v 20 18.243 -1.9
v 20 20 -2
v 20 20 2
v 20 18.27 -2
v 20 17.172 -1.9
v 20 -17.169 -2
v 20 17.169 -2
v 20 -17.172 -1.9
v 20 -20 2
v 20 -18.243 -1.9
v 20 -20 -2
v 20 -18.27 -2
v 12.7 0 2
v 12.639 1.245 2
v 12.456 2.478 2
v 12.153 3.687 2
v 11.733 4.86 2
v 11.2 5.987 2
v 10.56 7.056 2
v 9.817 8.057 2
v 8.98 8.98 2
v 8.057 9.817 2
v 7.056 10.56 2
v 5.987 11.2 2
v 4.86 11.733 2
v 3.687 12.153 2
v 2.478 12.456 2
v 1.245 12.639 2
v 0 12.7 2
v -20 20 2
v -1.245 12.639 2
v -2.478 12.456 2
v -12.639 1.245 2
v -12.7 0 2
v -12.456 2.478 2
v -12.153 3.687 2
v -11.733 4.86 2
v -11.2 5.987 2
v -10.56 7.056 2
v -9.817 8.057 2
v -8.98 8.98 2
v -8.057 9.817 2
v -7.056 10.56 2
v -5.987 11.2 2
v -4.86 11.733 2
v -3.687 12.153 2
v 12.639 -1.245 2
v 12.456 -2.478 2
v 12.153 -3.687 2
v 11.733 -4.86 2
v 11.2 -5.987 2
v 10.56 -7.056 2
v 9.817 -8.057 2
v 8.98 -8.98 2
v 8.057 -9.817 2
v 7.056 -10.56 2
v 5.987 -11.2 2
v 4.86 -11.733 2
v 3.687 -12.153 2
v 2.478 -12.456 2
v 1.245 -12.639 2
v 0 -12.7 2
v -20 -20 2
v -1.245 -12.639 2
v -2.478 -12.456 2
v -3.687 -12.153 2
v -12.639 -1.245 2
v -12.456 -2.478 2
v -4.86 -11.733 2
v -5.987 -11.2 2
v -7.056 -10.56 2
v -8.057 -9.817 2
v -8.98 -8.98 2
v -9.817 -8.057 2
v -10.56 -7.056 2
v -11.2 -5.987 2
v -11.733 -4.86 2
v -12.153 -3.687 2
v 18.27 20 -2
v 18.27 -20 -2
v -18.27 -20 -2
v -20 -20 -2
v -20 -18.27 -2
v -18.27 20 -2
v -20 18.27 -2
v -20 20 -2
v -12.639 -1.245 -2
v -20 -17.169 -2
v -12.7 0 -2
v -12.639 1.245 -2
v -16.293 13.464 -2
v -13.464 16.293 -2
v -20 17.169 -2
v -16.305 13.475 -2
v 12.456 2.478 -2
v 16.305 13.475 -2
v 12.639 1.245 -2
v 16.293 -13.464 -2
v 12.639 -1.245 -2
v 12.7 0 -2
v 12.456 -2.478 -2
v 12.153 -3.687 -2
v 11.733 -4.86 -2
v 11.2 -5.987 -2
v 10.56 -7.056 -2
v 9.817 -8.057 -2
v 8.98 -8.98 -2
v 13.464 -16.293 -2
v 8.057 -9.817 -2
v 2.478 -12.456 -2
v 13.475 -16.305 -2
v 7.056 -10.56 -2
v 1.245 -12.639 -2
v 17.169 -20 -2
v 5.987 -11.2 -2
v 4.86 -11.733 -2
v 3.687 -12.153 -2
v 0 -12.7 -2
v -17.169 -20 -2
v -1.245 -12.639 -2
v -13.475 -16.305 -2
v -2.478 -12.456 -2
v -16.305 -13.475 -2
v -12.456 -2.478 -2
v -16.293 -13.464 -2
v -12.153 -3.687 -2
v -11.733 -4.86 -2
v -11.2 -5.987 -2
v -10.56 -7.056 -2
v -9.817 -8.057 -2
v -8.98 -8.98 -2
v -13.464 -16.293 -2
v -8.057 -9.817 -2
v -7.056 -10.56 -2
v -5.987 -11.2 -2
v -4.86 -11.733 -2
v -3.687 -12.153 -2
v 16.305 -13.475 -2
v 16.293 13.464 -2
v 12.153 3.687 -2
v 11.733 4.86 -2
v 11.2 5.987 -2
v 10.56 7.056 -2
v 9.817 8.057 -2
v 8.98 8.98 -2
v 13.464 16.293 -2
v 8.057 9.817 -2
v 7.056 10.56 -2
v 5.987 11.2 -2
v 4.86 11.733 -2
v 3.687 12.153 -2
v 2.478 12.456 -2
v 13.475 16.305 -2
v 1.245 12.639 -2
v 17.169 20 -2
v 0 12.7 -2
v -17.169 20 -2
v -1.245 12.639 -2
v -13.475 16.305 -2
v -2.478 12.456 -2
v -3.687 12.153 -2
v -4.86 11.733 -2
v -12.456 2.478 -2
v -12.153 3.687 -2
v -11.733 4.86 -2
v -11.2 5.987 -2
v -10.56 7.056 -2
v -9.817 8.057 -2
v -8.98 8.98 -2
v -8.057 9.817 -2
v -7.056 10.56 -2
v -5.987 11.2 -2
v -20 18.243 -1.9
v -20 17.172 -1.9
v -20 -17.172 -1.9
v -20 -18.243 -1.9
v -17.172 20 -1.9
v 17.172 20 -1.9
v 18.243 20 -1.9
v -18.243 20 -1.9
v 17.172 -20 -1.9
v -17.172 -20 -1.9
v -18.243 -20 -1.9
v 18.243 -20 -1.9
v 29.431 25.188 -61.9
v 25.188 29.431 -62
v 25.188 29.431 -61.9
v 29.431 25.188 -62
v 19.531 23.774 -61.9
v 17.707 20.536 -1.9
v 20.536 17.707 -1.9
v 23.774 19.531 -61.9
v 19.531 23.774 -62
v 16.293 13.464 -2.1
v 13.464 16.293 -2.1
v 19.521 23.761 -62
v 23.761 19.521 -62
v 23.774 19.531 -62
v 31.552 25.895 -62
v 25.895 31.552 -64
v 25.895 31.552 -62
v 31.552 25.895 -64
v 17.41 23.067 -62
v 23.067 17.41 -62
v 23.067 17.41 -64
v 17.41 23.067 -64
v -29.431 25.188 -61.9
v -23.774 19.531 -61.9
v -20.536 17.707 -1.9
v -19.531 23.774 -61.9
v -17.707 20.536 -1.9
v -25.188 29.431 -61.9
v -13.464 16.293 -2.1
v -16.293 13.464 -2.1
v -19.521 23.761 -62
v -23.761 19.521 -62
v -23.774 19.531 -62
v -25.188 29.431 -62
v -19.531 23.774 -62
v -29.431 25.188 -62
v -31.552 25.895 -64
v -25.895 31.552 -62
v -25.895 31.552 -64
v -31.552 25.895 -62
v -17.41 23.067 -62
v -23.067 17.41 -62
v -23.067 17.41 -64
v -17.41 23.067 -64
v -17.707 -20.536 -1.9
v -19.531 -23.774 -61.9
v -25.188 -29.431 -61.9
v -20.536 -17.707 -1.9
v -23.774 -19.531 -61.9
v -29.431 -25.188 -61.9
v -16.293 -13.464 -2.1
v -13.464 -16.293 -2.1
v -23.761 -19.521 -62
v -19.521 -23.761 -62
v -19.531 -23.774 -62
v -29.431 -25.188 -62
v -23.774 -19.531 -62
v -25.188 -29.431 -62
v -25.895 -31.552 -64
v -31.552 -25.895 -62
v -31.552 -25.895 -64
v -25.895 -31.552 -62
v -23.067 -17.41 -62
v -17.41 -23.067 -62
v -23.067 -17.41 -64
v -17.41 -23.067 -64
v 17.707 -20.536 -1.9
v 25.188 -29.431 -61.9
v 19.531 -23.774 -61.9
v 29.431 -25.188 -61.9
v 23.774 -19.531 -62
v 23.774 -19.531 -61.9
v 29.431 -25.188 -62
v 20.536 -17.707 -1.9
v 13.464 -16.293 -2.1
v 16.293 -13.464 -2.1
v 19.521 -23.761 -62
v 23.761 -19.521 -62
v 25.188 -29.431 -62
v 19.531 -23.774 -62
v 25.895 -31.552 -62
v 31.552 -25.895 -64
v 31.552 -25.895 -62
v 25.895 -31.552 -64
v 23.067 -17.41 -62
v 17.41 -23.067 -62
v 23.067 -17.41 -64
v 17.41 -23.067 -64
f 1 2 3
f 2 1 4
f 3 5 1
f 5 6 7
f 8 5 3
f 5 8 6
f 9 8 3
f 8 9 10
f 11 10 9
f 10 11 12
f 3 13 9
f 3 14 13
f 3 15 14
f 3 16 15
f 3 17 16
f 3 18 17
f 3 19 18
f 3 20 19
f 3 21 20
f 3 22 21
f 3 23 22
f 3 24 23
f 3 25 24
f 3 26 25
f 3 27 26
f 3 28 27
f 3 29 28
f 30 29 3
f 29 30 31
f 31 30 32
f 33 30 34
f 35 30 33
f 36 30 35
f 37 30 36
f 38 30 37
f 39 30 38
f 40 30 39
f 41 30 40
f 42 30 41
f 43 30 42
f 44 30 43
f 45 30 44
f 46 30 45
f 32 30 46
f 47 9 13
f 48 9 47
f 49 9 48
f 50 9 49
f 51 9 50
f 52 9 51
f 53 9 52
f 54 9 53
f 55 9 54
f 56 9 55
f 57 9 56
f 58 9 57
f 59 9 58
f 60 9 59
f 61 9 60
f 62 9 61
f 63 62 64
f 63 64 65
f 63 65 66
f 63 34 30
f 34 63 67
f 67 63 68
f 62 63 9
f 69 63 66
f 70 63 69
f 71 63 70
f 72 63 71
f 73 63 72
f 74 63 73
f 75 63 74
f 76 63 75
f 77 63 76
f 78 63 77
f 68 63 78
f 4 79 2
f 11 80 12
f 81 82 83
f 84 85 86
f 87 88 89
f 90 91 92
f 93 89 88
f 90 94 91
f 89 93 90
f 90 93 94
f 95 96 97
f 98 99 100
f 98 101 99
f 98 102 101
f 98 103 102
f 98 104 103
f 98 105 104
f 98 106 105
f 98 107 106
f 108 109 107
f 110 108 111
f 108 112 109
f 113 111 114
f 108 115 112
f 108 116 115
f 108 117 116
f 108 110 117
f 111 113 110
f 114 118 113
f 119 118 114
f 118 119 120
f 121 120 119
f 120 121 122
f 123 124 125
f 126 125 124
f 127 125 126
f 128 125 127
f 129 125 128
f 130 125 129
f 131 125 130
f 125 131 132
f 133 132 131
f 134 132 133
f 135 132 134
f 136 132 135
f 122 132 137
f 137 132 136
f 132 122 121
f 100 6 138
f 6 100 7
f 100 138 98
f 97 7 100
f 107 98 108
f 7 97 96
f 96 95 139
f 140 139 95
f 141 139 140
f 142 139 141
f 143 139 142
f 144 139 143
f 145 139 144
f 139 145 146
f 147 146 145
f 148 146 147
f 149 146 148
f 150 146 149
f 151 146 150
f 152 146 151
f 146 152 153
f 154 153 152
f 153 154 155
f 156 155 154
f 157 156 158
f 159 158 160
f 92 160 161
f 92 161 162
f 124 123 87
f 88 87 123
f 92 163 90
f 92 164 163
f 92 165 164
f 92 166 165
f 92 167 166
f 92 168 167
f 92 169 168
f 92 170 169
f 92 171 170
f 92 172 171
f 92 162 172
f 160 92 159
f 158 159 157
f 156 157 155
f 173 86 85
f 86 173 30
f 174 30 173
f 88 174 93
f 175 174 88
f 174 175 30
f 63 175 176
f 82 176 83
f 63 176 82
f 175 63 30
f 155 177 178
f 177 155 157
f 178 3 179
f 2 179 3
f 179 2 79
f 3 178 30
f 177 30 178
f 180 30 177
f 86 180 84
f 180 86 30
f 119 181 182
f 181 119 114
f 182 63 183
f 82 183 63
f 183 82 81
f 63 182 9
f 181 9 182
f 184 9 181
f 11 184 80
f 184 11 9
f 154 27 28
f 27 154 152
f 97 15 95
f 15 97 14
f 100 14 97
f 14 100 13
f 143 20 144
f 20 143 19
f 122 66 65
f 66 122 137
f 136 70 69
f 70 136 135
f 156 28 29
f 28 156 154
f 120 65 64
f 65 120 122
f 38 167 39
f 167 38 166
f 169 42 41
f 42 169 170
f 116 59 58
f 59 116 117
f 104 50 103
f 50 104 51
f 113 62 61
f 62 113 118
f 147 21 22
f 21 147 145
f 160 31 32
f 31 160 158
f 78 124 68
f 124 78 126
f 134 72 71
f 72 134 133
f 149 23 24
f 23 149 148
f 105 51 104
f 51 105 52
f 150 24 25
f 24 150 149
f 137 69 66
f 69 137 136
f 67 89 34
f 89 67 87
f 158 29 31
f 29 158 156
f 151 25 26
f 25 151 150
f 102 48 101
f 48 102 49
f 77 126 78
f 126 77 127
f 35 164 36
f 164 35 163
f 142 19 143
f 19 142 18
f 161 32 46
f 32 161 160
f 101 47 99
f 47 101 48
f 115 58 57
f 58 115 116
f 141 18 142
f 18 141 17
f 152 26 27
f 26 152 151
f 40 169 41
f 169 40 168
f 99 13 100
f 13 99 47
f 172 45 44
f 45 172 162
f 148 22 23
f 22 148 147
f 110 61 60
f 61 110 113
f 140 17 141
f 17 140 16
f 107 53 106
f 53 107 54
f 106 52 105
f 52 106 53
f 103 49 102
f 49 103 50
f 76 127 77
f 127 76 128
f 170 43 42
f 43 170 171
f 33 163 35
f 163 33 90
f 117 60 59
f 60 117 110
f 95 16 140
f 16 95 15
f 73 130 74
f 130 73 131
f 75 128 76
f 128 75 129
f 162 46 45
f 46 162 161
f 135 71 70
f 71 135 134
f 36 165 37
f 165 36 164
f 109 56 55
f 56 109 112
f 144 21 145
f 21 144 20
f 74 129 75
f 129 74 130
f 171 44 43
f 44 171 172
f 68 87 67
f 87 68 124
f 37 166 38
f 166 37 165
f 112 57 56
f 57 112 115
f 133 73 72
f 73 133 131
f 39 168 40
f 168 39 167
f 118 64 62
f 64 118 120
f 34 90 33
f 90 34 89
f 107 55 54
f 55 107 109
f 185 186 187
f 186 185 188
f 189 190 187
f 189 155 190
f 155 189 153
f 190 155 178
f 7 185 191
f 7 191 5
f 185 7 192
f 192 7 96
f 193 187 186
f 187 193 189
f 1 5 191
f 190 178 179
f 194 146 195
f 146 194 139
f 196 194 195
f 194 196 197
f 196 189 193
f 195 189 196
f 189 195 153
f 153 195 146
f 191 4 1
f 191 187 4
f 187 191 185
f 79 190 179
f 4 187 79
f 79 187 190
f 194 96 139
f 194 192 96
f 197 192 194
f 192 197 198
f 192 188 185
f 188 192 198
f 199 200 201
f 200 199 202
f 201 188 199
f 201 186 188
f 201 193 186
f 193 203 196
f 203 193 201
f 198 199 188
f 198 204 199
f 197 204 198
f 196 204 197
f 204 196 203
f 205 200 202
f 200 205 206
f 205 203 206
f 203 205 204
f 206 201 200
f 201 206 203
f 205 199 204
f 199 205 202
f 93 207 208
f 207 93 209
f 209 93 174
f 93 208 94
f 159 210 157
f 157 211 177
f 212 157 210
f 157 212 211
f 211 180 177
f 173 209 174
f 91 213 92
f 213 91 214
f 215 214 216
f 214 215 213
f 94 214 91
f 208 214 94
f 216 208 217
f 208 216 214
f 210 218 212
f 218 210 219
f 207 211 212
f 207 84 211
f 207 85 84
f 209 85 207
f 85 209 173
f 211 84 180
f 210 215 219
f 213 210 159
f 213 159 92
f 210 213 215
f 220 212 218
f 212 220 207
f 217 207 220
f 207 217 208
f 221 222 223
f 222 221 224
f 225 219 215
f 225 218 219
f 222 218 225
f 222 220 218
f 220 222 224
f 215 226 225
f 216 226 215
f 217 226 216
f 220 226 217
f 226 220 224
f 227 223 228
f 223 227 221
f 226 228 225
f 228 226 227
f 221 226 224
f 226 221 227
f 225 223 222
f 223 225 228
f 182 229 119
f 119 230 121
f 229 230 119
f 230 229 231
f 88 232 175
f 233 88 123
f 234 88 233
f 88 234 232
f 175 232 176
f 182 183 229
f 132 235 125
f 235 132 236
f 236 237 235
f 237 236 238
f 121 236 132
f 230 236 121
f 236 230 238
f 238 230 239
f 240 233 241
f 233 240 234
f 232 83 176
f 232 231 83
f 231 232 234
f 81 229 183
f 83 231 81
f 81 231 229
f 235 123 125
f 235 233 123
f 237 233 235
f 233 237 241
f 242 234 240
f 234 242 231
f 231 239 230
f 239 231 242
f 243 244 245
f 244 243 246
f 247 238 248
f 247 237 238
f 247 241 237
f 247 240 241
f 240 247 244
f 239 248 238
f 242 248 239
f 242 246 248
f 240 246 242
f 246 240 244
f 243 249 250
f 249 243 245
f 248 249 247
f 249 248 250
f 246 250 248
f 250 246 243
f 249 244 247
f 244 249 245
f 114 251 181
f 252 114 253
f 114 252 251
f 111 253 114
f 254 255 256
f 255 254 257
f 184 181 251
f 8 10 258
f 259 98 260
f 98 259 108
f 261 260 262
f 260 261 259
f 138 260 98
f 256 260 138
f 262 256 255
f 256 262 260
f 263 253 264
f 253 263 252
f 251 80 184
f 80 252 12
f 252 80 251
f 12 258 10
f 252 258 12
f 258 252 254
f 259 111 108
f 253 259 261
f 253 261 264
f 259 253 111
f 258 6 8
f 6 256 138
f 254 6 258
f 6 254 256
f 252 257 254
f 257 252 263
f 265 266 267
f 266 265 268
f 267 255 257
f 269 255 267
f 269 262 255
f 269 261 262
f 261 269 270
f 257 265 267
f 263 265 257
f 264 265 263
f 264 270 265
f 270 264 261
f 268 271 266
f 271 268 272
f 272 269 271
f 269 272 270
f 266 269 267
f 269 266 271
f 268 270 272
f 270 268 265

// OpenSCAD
// ========================
// Small Table with Gently Splayed Legs
// ========================

// ---- Core parameters ----
top_size          = 40;    // mm (square tabletop: top_size x top_size)
top_thickness     = 4;     // mm
table_height      = 60;    // mm (underside of top to floor)
leg_angle_deg     = 10;    // degrees outward from vertical (gentle splay)

// ---- Leg geometry ----
leg_inset         = 3;     // mm in from each corner under the top
leg_top_w         = 6;     // mm leg width at top (in leg's local X)
leg_top_t         = 4;     // mm leg thickness at top (in leg's local Y)
leg_bottom_w      = 8;     // mm leg width at bottom
leg_bottom_t      = 6;     // mm leg thickness at bottom

// ---- Foot (optional) ----
add_feet          = true;
foot_len          = 12;    // mm length along leg width direction
foot_wid          = 8;     // mm length along leg thickness direction
foot_thickness    = 2;     // mm

$fn = 64;

// ---- Derived ----
attach_z   = -top_thickness/2;                 // underside of top is Z=attach_z
corner_off = top_size/2 - leg_inset;           // XY attach position per corner
horiz_run  = table_height * tan(leg_angle_deg);// how far the bottom moves outward

// ========================
// Modules
// ========================
module tabletop() {
    // Simple square top; swap with rounded_top() if you want fillets.
    translate([0,0,top_thickness/2])
        cube([top_size, top_size, top_thickness], center=true);
}

// Tapered, outward-splayed leg built with hull() between a small
// top "slice" and a bottom "slice" offset outward.
module leg_at_corner(azimuth_deg, xsign, ysign) {
    // Position at the underside near the corner
    translate([xsign*corner_off, ysign*corner_off, attach_z]) {
        // Align leg local +X toward the corner diagonal
        rotate([0,0,azimuth_deg]) {
            // Tapered strut via hull of two thin rectangular slices
            hull() {
                // Top slice (tiny Z thickness)
                translate([-leg_top_w/2, -leg_top_t/2, -0.1])
                    cube([leg_top_w, leg_top_t, 0.2]);

                // Bottom slice, shifted outward along +X and down by table_height
                translate([horiz_run - leg_bottom_w/2, -leg_bottom_t/2, -table_height-0.1])
                    cube([leg_bottom_w, leg_bottom_t, 0.2]);
            }

            // Optional simple foot pad at the bottom
            if (add_feet) {
                translate([horiz_run - foot_len/2, -foot_wid/2, -table_height - foot_thickness])
                    cube([foot_len, foot_wid, foot_thickness]);
            }
        }
    }
}

// ========================
// Assembly
// ========================
union() {
    difference()
    {
        translate([0,0,-2])tabletop();
        translate([0,0,-50])cylinder(h=100,r1=12.7,r2=12.7);
    }

    // Legs aimed toward the four corners (diagonals)
    leg_at_corner( 45, +1, +1);
    leg_at_corner(135, -1, +1);
    leg_at_corner(225, -1, -1);
    leg_at_corner(315, +1, -1);
}

// ========================
// Optional: rounded top (swap into tabletop() if desired)
// ========================
/*
module rounded_top(r=3) {
    // Minkowski fillet: grows all edges by r, then subtract in Z to keep thickness exact
    minkowski() {
        translate([0,0,top_thickness/2])
            cube([top_size - 2*r, top_size - 2*r, top_thickness - 2*r], center=true);
        cylinder(h=r, r=r, center=false);
    }
}
*/
